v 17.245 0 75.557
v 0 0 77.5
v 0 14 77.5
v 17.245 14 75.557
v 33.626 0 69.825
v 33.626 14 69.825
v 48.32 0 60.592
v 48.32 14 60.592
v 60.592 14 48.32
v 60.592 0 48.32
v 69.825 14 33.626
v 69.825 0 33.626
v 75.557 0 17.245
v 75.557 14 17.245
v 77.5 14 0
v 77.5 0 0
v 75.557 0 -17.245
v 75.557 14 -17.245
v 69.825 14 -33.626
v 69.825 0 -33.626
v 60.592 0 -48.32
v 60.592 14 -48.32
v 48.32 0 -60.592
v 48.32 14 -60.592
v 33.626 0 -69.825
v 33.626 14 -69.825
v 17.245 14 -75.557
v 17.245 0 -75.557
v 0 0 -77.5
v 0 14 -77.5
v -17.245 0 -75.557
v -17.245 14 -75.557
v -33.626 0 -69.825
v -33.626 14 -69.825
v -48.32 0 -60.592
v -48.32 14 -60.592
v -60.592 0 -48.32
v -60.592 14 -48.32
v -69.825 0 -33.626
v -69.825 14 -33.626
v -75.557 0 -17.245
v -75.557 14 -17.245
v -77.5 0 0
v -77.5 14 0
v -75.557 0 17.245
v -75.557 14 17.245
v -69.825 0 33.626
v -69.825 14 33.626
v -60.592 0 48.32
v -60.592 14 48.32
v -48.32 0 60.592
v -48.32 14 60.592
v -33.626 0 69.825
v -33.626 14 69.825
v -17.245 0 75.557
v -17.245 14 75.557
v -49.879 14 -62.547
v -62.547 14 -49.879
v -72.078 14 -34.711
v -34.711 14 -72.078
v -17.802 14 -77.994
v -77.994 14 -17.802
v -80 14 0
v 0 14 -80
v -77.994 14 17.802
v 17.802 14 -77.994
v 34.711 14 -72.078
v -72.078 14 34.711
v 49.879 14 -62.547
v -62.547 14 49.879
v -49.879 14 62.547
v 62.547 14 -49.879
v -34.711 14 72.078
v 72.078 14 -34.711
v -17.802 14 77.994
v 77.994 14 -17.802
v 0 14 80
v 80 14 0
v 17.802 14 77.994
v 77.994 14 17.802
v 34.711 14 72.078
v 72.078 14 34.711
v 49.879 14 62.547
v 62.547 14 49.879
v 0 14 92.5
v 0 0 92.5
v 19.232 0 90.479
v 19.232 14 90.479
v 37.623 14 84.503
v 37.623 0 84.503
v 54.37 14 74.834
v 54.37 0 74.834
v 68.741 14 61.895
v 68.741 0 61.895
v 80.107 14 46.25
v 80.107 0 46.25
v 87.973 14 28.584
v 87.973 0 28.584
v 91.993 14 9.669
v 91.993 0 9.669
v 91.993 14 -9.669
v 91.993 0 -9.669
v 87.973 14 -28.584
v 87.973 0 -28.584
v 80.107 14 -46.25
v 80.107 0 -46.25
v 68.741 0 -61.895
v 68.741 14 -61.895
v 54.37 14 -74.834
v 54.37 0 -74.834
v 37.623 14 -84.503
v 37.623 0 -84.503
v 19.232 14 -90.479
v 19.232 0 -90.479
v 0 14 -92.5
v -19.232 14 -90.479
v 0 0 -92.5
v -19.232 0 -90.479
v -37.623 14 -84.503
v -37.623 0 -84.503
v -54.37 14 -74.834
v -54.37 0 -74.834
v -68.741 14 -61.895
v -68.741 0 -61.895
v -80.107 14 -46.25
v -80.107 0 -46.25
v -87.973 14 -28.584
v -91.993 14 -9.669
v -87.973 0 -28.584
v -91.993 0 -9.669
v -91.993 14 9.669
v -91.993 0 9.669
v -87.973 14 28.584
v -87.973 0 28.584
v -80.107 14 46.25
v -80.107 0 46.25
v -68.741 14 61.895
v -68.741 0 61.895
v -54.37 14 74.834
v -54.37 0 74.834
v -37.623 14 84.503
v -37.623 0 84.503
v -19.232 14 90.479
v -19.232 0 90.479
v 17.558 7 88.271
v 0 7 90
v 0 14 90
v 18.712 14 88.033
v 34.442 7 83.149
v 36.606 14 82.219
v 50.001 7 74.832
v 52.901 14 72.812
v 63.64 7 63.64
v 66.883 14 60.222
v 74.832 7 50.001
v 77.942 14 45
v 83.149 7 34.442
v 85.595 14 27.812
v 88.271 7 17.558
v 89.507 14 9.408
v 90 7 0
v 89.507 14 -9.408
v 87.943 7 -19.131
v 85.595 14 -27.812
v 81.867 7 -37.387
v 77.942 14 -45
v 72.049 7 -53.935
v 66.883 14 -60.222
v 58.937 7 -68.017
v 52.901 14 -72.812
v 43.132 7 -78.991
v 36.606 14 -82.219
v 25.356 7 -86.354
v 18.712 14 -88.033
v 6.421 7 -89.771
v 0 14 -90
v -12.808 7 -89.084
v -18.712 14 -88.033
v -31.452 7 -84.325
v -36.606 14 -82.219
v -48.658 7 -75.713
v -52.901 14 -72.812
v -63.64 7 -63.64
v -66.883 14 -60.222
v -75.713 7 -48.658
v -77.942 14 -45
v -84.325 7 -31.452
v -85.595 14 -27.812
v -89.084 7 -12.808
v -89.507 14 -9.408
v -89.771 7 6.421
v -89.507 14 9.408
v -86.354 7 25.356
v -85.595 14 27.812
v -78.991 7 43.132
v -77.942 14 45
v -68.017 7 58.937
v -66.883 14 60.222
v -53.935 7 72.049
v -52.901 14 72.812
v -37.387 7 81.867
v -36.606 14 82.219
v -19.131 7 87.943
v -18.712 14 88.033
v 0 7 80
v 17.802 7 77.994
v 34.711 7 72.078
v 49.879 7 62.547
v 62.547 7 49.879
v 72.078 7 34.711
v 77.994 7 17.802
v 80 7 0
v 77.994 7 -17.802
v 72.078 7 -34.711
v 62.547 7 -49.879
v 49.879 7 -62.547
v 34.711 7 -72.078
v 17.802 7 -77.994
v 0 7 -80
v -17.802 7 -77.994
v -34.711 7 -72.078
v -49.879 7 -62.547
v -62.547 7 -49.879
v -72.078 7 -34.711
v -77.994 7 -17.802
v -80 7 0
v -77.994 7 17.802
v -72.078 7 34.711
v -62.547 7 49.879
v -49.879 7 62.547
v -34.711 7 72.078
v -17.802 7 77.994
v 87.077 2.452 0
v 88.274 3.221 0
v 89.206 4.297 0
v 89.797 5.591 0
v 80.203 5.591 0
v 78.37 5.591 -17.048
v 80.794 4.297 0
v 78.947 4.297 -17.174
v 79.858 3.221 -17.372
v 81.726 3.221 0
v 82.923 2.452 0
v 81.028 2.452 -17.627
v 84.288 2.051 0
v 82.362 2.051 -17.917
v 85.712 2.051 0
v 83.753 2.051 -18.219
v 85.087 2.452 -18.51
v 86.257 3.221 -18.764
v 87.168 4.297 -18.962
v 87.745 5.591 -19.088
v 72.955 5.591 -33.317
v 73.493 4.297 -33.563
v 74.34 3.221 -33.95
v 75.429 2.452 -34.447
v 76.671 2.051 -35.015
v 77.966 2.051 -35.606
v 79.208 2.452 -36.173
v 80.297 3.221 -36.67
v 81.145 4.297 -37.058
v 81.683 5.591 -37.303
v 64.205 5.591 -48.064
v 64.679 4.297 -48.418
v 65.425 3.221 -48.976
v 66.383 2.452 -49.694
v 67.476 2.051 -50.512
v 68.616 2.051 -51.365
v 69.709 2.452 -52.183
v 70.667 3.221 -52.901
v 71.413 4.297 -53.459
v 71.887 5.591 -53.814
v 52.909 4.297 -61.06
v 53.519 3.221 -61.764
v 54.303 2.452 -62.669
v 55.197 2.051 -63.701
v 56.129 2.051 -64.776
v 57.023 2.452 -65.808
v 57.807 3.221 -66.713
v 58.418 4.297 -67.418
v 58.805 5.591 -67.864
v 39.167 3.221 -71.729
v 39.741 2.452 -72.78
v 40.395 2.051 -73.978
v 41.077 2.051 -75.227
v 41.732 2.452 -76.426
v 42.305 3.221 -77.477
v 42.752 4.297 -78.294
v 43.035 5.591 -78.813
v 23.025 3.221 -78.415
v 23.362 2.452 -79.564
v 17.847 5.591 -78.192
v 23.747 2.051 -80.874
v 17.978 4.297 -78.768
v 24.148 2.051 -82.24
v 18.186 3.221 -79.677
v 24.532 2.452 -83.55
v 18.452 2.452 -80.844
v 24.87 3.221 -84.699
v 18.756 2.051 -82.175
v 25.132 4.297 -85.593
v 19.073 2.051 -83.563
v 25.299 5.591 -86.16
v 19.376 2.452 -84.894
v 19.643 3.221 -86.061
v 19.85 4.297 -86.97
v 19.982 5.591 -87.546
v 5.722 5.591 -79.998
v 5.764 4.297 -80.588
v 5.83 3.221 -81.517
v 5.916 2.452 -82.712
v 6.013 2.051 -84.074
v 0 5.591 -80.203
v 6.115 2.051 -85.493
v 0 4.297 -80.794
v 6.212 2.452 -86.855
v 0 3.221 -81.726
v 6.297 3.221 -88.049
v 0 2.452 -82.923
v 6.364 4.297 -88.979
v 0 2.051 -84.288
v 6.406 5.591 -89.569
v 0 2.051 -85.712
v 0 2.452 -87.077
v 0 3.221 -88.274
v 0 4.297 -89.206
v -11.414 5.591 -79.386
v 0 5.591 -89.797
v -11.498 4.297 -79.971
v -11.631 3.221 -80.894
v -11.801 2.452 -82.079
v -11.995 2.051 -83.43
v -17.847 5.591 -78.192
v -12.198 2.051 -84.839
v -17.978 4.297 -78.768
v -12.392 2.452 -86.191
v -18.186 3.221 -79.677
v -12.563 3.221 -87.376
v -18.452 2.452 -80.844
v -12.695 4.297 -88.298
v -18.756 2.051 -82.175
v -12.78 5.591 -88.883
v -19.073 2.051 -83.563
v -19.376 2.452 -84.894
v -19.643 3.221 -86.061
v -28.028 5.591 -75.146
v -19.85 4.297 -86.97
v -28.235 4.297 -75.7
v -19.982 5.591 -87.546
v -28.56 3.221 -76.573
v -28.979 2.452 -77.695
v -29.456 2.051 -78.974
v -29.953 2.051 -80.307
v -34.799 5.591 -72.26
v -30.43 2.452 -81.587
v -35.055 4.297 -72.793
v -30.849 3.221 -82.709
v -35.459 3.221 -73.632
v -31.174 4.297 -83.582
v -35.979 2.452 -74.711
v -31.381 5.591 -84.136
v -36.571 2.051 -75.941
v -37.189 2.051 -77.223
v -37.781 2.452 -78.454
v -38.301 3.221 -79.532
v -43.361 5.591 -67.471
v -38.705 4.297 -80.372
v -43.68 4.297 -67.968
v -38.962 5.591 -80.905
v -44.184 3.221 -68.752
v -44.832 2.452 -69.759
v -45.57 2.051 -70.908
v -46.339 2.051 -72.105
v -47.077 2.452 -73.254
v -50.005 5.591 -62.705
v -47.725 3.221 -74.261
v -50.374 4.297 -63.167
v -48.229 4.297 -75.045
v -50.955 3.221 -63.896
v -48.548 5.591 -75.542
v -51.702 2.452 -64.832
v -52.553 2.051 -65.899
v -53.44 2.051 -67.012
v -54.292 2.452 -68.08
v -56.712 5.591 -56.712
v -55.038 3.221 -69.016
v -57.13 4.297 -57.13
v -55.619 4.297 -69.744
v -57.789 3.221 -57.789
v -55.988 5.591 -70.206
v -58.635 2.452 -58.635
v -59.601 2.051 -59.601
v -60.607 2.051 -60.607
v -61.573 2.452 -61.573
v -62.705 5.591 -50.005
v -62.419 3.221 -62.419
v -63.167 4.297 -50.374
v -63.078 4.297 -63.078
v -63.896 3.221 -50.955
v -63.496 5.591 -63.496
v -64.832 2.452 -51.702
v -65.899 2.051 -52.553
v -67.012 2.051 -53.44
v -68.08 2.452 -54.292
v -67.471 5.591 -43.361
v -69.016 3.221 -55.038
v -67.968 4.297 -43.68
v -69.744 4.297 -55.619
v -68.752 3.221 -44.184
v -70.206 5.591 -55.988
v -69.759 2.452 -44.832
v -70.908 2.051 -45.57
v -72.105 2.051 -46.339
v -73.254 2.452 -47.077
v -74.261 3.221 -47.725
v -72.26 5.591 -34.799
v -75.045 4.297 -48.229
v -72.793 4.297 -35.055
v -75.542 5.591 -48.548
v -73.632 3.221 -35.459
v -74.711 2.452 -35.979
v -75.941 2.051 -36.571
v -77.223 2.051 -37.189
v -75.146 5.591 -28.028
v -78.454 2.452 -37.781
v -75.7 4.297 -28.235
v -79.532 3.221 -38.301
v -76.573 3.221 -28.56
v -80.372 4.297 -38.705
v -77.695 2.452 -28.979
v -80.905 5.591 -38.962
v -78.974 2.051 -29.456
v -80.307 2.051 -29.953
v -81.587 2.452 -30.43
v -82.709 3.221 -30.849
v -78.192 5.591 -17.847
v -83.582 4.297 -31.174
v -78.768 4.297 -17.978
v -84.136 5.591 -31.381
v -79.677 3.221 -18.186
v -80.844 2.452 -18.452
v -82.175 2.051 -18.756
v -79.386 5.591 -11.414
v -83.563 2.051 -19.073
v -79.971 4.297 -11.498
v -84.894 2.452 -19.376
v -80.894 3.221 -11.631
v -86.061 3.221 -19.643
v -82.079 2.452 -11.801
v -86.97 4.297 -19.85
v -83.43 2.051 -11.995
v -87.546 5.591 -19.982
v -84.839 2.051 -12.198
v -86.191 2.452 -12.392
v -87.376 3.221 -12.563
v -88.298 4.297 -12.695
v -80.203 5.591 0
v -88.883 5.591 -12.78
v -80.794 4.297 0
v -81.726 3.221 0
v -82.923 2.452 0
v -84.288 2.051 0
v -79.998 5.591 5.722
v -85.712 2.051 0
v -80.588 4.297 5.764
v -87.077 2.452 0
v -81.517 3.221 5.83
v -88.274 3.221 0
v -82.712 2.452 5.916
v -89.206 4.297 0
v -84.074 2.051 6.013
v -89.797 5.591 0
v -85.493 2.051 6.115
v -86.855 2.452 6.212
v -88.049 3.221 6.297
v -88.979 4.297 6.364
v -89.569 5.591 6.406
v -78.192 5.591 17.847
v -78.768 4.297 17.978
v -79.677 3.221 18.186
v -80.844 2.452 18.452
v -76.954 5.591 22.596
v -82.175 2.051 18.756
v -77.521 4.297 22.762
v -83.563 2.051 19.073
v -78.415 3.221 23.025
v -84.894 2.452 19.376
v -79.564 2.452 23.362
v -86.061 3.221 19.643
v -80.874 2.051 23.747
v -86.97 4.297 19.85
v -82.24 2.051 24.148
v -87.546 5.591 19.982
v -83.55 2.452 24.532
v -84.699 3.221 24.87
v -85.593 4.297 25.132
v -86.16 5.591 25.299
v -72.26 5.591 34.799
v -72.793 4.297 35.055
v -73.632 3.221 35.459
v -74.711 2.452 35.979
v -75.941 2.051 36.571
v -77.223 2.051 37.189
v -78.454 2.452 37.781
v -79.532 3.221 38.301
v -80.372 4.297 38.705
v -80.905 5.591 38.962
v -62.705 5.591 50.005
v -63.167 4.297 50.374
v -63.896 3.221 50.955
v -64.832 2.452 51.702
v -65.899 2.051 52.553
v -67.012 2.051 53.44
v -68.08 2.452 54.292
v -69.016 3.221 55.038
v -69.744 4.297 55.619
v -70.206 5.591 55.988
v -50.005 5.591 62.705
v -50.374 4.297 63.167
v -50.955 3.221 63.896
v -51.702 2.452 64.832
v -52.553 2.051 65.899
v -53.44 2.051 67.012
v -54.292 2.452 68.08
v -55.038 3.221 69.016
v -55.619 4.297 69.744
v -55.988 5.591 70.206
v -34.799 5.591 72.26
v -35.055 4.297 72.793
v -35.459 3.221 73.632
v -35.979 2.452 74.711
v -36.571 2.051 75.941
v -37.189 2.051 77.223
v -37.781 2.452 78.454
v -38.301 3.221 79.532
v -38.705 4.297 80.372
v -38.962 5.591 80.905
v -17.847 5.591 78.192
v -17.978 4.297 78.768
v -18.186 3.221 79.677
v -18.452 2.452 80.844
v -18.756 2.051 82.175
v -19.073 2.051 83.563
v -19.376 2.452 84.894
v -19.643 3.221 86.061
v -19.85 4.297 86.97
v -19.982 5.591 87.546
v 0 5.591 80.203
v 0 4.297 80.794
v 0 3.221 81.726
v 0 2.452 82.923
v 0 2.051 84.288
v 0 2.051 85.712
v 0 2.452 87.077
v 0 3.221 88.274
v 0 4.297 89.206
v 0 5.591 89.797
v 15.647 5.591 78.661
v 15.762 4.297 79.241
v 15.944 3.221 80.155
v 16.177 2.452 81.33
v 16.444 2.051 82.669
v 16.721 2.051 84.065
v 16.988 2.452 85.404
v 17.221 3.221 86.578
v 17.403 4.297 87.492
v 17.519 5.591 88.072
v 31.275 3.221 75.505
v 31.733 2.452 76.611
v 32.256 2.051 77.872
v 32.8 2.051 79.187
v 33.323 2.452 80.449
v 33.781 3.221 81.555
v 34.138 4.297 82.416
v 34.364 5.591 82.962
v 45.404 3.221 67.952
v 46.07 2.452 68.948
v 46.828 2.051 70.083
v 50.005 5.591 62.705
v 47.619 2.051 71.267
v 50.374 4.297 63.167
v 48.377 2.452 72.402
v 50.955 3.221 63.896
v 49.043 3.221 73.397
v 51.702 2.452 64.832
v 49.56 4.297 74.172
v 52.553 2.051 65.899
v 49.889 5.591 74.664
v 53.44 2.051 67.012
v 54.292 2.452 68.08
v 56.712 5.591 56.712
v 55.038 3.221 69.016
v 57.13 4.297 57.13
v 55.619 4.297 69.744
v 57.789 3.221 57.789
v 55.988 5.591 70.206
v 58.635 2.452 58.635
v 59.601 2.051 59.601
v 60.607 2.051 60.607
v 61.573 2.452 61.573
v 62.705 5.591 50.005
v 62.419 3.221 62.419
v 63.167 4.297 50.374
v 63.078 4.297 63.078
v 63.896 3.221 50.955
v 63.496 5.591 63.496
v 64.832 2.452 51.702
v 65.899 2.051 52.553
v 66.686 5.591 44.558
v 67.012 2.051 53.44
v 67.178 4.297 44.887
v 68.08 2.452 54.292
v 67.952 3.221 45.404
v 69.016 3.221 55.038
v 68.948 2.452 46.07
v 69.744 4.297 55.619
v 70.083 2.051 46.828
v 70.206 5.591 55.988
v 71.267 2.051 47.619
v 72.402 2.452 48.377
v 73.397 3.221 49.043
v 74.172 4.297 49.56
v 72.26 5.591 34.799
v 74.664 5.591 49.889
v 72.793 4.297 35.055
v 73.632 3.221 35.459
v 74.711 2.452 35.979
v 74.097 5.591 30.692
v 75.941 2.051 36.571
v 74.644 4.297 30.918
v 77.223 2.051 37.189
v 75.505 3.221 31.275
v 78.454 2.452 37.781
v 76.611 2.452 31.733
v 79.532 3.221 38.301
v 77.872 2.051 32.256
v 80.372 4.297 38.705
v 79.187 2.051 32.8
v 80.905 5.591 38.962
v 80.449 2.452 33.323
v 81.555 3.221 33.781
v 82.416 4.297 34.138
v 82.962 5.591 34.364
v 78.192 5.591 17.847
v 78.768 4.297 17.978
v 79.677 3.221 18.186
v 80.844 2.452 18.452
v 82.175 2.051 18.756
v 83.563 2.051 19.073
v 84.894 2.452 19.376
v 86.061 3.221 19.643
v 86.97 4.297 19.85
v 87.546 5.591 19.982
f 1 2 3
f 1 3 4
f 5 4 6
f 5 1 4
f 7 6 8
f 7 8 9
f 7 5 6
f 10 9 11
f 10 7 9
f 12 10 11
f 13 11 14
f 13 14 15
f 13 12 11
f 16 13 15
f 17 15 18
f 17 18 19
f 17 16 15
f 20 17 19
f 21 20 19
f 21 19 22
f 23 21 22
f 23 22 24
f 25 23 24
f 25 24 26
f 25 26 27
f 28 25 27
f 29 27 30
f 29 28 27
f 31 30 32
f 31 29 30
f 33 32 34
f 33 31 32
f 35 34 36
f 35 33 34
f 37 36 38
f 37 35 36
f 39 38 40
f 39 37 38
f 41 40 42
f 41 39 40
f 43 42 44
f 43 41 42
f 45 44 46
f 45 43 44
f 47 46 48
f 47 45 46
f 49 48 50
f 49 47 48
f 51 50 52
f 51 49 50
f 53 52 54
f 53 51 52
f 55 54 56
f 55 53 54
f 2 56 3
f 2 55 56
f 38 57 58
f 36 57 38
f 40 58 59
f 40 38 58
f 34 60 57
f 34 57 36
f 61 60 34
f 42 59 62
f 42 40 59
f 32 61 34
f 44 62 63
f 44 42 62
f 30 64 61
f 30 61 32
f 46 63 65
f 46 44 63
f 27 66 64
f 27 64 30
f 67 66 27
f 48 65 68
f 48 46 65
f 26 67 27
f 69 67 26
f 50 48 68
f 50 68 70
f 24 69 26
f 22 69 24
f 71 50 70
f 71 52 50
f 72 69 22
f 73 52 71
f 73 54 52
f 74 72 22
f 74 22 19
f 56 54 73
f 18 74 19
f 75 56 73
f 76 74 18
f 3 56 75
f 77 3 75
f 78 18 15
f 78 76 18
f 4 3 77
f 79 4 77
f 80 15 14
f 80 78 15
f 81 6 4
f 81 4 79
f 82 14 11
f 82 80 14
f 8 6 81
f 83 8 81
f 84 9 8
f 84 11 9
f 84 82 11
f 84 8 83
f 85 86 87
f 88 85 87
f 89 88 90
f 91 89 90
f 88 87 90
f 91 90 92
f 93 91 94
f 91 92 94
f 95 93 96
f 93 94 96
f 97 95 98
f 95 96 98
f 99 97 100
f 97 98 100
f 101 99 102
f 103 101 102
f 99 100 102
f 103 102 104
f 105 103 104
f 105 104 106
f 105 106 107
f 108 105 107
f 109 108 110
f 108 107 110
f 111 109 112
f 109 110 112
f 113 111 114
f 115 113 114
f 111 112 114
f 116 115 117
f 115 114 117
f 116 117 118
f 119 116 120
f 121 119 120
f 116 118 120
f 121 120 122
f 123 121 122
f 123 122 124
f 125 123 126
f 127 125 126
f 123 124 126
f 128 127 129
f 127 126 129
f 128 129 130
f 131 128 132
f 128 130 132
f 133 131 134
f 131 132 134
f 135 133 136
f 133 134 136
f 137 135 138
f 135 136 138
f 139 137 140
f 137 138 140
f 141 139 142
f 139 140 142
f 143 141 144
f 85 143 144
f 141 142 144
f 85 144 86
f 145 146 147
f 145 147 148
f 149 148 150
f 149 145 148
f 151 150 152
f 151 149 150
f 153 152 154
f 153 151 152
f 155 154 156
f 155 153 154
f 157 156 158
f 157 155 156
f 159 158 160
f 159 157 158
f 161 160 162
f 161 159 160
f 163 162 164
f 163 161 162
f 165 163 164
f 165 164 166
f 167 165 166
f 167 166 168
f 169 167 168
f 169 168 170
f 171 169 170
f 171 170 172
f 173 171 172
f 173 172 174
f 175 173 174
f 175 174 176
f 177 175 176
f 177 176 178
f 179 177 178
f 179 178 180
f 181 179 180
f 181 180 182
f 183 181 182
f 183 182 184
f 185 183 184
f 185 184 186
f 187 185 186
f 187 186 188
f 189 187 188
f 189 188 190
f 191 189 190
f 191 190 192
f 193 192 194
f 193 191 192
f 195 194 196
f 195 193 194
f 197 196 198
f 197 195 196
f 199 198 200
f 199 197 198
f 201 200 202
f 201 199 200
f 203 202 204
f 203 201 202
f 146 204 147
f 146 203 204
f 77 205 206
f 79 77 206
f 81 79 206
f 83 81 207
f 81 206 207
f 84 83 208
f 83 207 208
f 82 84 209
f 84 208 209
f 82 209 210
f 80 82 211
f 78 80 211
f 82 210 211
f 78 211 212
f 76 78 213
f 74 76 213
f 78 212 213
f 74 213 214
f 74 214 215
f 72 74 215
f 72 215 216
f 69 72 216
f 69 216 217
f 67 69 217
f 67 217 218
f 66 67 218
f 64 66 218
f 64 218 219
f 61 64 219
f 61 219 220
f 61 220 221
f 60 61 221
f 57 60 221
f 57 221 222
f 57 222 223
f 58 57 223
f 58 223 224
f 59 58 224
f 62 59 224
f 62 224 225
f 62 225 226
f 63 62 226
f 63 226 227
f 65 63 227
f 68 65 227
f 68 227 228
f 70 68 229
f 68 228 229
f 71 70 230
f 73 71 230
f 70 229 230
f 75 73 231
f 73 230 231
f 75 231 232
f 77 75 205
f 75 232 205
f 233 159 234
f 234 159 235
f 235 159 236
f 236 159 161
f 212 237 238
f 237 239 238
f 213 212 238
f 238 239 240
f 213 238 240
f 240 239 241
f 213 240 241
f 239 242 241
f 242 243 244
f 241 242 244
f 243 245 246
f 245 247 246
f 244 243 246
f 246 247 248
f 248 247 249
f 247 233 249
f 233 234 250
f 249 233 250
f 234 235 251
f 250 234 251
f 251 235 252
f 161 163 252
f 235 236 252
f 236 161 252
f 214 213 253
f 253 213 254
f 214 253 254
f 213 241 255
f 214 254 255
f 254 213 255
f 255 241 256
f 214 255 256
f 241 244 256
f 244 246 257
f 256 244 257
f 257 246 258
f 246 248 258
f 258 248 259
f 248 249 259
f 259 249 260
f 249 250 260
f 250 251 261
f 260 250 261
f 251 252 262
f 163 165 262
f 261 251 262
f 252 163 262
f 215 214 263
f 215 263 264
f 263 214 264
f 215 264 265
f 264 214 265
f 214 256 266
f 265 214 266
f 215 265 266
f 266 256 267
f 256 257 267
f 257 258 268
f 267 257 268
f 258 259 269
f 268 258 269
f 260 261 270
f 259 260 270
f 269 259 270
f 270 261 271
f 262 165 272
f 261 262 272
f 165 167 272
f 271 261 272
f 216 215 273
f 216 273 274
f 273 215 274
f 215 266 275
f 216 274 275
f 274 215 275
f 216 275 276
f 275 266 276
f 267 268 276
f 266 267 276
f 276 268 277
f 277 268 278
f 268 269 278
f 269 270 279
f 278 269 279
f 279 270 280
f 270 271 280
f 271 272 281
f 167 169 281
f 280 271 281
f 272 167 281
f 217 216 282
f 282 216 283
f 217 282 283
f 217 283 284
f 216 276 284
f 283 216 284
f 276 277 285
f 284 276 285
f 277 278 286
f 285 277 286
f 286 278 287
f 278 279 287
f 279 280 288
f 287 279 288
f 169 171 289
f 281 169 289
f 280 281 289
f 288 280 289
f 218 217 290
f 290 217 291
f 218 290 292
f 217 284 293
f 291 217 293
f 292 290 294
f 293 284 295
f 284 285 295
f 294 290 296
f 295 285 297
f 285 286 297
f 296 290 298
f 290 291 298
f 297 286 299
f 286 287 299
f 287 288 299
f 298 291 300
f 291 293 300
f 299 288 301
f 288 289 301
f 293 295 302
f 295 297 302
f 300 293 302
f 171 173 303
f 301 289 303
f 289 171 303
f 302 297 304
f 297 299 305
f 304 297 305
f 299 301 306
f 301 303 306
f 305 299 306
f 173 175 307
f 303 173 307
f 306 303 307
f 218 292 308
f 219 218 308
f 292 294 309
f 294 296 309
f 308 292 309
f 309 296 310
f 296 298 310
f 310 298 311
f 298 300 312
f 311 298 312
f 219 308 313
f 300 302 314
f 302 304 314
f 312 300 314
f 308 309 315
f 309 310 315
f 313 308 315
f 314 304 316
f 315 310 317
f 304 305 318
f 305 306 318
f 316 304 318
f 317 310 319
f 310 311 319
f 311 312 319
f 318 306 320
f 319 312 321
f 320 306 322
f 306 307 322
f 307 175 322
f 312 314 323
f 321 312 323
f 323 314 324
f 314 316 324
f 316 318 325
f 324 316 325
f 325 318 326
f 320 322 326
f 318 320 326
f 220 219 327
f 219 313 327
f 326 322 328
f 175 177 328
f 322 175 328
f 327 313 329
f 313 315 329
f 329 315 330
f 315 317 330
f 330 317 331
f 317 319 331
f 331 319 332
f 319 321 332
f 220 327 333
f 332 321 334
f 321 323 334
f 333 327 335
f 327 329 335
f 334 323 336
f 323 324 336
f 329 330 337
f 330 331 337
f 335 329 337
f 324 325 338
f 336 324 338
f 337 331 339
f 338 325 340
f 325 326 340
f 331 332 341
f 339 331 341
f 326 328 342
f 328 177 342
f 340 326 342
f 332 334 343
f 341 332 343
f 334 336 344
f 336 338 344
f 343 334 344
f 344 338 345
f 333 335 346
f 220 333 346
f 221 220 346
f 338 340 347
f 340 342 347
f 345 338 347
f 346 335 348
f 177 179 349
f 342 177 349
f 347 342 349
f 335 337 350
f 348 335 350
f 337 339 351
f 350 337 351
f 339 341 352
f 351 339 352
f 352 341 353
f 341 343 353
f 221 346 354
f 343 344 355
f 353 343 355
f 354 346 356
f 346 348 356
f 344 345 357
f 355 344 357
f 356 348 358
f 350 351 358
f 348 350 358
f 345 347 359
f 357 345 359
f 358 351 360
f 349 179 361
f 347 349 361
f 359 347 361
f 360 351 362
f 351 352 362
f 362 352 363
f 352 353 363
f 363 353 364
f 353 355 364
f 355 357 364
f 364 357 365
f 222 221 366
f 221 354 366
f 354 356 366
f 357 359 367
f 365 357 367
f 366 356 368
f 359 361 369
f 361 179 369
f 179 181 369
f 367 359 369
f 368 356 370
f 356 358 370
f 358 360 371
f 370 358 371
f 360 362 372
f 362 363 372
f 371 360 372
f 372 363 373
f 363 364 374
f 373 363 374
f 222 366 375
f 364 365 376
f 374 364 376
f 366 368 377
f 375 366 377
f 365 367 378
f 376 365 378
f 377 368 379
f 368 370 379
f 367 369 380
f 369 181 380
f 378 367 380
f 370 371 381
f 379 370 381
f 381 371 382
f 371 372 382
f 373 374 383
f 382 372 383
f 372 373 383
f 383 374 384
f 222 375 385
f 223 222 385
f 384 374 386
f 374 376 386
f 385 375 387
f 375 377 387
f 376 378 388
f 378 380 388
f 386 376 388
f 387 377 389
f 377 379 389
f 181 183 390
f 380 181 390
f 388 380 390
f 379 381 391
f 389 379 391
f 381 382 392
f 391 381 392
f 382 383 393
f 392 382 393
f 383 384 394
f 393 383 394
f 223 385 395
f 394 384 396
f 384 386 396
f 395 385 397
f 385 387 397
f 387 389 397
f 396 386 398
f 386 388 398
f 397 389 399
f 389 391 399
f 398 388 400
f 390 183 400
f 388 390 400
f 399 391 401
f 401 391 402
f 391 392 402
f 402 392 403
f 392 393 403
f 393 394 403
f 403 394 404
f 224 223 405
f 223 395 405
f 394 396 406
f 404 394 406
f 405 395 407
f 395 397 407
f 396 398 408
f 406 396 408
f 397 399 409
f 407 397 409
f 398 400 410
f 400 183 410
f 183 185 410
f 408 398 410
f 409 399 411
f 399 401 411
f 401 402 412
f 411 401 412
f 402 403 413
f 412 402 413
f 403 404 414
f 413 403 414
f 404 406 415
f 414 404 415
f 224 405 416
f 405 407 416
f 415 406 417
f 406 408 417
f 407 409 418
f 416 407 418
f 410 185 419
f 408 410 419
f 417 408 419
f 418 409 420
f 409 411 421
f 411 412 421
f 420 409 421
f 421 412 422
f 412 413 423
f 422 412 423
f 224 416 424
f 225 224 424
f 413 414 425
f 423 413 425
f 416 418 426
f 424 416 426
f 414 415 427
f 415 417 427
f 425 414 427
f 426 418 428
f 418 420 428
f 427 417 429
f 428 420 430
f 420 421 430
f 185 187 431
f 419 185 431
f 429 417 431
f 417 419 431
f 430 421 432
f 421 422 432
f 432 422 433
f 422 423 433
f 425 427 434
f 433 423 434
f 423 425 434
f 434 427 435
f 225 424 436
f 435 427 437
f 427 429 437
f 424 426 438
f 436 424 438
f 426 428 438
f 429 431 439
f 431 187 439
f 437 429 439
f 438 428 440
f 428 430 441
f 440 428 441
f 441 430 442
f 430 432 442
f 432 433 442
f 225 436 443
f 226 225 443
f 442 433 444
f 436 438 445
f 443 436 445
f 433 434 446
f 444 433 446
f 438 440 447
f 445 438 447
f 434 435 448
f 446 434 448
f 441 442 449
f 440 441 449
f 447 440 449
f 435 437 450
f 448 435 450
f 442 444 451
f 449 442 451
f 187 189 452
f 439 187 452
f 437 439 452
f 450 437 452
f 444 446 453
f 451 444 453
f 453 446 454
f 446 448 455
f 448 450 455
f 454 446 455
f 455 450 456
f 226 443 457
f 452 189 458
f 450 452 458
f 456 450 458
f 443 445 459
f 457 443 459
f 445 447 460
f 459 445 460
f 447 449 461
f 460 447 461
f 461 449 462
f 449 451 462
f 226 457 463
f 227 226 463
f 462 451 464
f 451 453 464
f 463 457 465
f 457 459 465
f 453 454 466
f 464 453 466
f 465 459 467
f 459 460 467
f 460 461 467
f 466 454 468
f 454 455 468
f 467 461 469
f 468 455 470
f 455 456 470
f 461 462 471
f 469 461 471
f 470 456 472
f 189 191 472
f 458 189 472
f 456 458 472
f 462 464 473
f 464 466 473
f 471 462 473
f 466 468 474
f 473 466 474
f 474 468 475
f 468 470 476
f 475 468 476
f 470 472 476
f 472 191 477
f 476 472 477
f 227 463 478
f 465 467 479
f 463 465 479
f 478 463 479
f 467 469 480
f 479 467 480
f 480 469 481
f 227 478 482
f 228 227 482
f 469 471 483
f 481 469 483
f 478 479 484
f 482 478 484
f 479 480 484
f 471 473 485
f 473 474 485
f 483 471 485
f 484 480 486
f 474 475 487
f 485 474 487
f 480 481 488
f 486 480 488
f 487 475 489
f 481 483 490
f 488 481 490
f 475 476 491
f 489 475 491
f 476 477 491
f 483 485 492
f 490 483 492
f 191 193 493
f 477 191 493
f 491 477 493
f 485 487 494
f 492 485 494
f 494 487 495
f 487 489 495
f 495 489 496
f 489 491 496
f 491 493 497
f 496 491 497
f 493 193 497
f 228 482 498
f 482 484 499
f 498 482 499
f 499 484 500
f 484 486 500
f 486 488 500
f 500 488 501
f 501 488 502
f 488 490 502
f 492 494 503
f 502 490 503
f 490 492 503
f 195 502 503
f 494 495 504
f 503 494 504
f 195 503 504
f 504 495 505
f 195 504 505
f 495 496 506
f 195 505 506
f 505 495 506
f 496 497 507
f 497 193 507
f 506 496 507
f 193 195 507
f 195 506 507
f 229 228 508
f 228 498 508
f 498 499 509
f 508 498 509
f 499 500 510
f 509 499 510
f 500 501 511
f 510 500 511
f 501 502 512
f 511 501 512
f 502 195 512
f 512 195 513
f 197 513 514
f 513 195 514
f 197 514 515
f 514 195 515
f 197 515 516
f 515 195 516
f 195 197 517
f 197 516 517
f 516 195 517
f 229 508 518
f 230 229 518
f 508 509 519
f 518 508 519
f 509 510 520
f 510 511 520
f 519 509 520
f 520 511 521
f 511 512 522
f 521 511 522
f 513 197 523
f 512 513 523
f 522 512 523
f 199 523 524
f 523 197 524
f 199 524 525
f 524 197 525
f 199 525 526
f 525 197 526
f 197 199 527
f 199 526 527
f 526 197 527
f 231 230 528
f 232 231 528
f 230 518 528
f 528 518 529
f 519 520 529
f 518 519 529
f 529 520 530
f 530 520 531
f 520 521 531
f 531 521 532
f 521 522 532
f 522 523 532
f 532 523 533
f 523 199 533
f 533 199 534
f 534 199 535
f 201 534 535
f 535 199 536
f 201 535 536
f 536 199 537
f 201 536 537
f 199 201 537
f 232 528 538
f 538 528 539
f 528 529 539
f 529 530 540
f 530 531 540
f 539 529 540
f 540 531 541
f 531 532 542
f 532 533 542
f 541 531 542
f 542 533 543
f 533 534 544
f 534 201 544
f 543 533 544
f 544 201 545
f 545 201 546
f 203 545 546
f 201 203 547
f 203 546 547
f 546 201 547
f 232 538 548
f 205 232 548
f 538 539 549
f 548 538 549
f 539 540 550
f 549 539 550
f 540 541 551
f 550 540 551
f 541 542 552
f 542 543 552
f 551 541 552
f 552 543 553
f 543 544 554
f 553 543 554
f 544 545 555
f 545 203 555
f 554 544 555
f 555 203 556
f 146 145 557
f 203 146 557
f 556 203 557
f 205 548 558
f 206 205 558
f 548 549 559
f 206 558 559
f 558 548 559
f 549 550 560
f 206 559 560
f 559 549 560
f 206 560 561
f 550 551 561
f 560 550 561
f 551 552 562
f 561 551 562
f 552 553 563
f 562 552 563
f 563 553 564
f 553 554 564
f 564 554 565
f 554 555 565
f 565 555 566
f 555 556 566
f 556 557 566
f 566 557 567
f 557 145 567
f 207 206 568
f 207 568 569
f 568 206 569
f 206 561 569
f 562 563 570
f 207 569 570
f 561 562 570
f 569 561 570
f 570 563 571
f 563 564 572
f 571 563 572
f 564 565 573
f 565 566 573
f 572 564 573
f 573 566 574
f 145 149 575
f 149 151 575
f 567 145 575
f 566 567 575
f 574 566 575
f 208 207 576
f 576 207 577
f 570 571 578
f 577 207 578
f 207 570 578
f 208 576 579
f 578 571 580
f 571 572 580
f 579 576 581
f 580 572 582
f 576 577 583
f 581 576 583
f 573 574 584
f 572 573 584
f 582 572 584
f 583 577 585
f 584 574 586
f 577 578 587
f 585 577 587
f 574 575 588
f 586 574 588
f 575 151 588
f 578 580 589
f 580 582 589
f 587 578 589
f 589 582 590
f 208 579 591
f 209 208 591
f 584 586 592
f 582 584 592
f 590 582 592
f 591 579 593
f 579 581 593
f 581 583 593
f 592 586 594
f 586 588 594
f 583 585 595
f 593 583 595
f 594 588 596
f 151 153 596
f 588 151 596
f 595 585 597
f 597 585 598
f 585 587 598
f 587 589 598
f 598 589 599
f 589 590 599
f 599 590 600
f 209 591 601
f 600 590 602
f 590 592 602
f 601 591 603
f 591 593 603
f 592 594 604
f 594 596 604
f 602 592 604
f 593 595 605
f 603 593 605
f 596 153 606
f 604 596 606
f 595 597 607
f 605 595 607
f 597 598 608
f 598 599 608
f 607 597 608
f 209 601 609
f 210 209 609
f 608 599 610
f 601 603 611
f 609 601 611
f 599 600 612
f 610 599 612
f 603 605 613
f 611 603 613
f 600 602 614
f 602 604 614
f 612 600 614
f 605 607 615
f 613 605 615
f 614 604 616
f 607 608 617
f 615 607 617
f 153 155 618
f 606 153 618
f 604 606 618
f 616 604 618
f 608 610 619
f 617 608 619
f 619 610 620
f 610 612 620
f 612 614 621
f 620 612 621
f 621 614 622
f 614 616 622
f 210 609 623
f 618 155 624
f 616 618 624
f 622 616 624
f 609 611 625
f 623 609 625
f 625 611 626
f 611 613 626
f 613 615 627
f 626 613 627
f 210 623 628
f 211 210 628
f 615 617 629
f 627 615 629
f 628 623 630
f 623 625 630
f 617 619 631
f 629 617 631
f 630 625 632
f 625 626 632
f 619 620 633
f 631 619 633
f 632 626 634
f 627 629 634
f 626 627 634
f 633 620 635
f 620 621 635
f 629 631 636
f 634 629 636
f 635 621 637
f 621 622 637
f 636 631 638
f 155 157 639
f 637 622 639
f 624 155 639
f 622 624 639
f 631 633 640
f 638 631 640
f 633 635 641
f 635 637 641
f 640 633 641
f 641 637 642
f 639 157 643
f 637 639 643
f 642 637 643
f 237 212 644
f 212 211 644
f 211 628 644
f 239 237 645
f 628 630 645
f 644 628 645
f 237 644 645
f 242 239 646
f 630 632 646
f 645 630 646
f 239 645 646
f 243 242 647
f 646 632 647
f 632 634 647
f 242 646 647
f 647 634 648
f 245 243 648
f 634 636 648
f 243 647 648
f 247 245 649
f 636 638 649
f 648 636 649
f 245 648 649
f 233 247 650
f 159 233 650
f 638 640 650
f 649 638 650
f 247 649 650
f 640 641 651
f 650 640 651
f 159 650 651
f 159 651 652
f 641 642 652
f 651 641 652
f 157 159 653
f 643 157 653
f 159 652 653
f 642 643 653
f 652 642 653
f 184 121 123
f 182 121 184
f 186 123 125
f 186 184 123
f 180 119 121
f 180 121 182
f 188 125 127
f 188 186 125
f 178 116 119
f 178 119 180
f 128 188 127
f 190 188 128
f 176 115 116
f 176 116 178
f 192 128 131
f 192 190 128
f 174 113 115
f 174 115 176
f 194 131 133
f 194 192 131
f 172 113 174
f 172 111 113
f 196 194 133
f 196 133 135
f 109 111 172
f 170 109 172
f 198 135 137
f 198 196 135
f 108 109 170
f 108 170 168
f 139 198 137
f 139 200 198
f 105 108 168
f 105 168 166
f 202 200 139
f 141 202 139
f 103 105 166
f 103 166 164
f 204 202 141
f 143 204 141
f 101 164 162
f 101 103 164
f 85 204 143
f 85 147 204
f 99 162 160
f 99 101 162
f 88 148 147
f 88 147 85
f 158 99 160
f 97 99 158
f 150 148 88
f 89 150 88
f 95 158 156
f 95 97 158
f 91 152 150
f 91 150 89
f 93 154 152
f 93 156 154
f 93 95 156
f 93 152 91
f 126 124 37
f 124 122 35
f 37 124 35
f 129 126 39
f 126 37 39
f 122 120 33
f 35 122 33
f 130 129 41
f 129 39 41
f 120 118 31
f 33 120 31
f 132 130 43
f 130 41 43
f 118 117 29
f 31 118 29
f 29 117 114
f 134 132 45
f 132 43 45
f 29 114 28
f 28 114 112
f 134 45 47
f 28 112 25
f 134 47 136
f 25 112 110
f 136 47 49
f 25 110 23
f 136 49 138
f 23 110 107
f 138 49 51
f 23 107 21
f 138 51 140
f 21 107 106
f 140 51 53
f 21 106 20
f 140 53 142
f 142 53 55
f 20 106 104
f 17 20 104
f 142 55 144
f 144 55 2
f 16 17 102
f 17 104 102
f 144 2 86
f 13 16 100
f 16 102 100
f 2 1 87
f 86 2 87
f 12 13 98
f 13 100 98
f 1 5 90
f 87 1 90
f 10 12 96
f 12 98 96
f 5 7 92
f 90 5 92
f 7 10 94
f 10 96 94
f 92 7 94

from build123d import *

# Parameters (mm, degrees)
SKETCH_1_R      = 90
SKETCH_1_R_2    = 80
EXTRUDE_1_DEPTH = 7
SKETCH_1_3_R    = 92.5
SKETCH_1_3_R_2  = 90
SKETCH_1_3_R_3  = 80
SKETCH_1_3_R_4  = 77.5
EXTRUDE_2_DEPTH = 14


with BuildPart() as part:
    # 草图1 → 凸台-拉伸1 (new body)
    with BuildSketch(Plane(origin=(0, 0, 0), x_dir=(1, 0, 0), z_dir=(0, 1, 0))):
        Circle(SKETCH_1_R)
        Circle(SKETCH_1_R_2, mode=Mode.SUBTRACT)
    extrude(amount=EXTRUDE_1_DEPTH)

    # 草图1<3> → 凸台-拉伸2 (add)
    # profile 1 of 2: a face of its own
    with BuildSketch(Plane(origin=(0, 0, 0), x_dir=(1, 0, 0), z_dir=(0, 1, 0))):
        Circle(SKETCH_1_3_R)
        Circle(SKETCH_1_3_R_2, mode=Mode.SUBTRACT)
    # profile 2 of 2: a face of its own
    with BuildSketch(Plane(origin=(0, 0, 0), x_dir=(1, 0, 0), z_dir=(0, 1, 0))):
        Circle(SKETCH_1_3_R_3)
        Circle(SKETCH_1_3_R_4, mode=Mode.SUBTRACT)
    extrude(amount=EXTRUDE_2_DEPTH)

    # 切除-扫描1: sweep along a path in 草图3
    with BuildLine(Plane(origin=(0, 7, 0), x_dir=(1, 0, 0), z_dir=(0, 1, 0))) as sweep_1_path:
        CenterArc((0, 0), 85, 0, 360)
    # 草图2 → 切除-扫描1 (sweep, cut)
    with BuildSketch(Plane.XY):
        with BuildLine():
            Line((-90, 7), (-80, 7))
            ThreePointArc((-80, 7), (-85, 2), (-90, 7))
        make_face()
    sweep(path=sweep_1_path.line, mode=Mode.SUBTRACT)


solid = part.part
